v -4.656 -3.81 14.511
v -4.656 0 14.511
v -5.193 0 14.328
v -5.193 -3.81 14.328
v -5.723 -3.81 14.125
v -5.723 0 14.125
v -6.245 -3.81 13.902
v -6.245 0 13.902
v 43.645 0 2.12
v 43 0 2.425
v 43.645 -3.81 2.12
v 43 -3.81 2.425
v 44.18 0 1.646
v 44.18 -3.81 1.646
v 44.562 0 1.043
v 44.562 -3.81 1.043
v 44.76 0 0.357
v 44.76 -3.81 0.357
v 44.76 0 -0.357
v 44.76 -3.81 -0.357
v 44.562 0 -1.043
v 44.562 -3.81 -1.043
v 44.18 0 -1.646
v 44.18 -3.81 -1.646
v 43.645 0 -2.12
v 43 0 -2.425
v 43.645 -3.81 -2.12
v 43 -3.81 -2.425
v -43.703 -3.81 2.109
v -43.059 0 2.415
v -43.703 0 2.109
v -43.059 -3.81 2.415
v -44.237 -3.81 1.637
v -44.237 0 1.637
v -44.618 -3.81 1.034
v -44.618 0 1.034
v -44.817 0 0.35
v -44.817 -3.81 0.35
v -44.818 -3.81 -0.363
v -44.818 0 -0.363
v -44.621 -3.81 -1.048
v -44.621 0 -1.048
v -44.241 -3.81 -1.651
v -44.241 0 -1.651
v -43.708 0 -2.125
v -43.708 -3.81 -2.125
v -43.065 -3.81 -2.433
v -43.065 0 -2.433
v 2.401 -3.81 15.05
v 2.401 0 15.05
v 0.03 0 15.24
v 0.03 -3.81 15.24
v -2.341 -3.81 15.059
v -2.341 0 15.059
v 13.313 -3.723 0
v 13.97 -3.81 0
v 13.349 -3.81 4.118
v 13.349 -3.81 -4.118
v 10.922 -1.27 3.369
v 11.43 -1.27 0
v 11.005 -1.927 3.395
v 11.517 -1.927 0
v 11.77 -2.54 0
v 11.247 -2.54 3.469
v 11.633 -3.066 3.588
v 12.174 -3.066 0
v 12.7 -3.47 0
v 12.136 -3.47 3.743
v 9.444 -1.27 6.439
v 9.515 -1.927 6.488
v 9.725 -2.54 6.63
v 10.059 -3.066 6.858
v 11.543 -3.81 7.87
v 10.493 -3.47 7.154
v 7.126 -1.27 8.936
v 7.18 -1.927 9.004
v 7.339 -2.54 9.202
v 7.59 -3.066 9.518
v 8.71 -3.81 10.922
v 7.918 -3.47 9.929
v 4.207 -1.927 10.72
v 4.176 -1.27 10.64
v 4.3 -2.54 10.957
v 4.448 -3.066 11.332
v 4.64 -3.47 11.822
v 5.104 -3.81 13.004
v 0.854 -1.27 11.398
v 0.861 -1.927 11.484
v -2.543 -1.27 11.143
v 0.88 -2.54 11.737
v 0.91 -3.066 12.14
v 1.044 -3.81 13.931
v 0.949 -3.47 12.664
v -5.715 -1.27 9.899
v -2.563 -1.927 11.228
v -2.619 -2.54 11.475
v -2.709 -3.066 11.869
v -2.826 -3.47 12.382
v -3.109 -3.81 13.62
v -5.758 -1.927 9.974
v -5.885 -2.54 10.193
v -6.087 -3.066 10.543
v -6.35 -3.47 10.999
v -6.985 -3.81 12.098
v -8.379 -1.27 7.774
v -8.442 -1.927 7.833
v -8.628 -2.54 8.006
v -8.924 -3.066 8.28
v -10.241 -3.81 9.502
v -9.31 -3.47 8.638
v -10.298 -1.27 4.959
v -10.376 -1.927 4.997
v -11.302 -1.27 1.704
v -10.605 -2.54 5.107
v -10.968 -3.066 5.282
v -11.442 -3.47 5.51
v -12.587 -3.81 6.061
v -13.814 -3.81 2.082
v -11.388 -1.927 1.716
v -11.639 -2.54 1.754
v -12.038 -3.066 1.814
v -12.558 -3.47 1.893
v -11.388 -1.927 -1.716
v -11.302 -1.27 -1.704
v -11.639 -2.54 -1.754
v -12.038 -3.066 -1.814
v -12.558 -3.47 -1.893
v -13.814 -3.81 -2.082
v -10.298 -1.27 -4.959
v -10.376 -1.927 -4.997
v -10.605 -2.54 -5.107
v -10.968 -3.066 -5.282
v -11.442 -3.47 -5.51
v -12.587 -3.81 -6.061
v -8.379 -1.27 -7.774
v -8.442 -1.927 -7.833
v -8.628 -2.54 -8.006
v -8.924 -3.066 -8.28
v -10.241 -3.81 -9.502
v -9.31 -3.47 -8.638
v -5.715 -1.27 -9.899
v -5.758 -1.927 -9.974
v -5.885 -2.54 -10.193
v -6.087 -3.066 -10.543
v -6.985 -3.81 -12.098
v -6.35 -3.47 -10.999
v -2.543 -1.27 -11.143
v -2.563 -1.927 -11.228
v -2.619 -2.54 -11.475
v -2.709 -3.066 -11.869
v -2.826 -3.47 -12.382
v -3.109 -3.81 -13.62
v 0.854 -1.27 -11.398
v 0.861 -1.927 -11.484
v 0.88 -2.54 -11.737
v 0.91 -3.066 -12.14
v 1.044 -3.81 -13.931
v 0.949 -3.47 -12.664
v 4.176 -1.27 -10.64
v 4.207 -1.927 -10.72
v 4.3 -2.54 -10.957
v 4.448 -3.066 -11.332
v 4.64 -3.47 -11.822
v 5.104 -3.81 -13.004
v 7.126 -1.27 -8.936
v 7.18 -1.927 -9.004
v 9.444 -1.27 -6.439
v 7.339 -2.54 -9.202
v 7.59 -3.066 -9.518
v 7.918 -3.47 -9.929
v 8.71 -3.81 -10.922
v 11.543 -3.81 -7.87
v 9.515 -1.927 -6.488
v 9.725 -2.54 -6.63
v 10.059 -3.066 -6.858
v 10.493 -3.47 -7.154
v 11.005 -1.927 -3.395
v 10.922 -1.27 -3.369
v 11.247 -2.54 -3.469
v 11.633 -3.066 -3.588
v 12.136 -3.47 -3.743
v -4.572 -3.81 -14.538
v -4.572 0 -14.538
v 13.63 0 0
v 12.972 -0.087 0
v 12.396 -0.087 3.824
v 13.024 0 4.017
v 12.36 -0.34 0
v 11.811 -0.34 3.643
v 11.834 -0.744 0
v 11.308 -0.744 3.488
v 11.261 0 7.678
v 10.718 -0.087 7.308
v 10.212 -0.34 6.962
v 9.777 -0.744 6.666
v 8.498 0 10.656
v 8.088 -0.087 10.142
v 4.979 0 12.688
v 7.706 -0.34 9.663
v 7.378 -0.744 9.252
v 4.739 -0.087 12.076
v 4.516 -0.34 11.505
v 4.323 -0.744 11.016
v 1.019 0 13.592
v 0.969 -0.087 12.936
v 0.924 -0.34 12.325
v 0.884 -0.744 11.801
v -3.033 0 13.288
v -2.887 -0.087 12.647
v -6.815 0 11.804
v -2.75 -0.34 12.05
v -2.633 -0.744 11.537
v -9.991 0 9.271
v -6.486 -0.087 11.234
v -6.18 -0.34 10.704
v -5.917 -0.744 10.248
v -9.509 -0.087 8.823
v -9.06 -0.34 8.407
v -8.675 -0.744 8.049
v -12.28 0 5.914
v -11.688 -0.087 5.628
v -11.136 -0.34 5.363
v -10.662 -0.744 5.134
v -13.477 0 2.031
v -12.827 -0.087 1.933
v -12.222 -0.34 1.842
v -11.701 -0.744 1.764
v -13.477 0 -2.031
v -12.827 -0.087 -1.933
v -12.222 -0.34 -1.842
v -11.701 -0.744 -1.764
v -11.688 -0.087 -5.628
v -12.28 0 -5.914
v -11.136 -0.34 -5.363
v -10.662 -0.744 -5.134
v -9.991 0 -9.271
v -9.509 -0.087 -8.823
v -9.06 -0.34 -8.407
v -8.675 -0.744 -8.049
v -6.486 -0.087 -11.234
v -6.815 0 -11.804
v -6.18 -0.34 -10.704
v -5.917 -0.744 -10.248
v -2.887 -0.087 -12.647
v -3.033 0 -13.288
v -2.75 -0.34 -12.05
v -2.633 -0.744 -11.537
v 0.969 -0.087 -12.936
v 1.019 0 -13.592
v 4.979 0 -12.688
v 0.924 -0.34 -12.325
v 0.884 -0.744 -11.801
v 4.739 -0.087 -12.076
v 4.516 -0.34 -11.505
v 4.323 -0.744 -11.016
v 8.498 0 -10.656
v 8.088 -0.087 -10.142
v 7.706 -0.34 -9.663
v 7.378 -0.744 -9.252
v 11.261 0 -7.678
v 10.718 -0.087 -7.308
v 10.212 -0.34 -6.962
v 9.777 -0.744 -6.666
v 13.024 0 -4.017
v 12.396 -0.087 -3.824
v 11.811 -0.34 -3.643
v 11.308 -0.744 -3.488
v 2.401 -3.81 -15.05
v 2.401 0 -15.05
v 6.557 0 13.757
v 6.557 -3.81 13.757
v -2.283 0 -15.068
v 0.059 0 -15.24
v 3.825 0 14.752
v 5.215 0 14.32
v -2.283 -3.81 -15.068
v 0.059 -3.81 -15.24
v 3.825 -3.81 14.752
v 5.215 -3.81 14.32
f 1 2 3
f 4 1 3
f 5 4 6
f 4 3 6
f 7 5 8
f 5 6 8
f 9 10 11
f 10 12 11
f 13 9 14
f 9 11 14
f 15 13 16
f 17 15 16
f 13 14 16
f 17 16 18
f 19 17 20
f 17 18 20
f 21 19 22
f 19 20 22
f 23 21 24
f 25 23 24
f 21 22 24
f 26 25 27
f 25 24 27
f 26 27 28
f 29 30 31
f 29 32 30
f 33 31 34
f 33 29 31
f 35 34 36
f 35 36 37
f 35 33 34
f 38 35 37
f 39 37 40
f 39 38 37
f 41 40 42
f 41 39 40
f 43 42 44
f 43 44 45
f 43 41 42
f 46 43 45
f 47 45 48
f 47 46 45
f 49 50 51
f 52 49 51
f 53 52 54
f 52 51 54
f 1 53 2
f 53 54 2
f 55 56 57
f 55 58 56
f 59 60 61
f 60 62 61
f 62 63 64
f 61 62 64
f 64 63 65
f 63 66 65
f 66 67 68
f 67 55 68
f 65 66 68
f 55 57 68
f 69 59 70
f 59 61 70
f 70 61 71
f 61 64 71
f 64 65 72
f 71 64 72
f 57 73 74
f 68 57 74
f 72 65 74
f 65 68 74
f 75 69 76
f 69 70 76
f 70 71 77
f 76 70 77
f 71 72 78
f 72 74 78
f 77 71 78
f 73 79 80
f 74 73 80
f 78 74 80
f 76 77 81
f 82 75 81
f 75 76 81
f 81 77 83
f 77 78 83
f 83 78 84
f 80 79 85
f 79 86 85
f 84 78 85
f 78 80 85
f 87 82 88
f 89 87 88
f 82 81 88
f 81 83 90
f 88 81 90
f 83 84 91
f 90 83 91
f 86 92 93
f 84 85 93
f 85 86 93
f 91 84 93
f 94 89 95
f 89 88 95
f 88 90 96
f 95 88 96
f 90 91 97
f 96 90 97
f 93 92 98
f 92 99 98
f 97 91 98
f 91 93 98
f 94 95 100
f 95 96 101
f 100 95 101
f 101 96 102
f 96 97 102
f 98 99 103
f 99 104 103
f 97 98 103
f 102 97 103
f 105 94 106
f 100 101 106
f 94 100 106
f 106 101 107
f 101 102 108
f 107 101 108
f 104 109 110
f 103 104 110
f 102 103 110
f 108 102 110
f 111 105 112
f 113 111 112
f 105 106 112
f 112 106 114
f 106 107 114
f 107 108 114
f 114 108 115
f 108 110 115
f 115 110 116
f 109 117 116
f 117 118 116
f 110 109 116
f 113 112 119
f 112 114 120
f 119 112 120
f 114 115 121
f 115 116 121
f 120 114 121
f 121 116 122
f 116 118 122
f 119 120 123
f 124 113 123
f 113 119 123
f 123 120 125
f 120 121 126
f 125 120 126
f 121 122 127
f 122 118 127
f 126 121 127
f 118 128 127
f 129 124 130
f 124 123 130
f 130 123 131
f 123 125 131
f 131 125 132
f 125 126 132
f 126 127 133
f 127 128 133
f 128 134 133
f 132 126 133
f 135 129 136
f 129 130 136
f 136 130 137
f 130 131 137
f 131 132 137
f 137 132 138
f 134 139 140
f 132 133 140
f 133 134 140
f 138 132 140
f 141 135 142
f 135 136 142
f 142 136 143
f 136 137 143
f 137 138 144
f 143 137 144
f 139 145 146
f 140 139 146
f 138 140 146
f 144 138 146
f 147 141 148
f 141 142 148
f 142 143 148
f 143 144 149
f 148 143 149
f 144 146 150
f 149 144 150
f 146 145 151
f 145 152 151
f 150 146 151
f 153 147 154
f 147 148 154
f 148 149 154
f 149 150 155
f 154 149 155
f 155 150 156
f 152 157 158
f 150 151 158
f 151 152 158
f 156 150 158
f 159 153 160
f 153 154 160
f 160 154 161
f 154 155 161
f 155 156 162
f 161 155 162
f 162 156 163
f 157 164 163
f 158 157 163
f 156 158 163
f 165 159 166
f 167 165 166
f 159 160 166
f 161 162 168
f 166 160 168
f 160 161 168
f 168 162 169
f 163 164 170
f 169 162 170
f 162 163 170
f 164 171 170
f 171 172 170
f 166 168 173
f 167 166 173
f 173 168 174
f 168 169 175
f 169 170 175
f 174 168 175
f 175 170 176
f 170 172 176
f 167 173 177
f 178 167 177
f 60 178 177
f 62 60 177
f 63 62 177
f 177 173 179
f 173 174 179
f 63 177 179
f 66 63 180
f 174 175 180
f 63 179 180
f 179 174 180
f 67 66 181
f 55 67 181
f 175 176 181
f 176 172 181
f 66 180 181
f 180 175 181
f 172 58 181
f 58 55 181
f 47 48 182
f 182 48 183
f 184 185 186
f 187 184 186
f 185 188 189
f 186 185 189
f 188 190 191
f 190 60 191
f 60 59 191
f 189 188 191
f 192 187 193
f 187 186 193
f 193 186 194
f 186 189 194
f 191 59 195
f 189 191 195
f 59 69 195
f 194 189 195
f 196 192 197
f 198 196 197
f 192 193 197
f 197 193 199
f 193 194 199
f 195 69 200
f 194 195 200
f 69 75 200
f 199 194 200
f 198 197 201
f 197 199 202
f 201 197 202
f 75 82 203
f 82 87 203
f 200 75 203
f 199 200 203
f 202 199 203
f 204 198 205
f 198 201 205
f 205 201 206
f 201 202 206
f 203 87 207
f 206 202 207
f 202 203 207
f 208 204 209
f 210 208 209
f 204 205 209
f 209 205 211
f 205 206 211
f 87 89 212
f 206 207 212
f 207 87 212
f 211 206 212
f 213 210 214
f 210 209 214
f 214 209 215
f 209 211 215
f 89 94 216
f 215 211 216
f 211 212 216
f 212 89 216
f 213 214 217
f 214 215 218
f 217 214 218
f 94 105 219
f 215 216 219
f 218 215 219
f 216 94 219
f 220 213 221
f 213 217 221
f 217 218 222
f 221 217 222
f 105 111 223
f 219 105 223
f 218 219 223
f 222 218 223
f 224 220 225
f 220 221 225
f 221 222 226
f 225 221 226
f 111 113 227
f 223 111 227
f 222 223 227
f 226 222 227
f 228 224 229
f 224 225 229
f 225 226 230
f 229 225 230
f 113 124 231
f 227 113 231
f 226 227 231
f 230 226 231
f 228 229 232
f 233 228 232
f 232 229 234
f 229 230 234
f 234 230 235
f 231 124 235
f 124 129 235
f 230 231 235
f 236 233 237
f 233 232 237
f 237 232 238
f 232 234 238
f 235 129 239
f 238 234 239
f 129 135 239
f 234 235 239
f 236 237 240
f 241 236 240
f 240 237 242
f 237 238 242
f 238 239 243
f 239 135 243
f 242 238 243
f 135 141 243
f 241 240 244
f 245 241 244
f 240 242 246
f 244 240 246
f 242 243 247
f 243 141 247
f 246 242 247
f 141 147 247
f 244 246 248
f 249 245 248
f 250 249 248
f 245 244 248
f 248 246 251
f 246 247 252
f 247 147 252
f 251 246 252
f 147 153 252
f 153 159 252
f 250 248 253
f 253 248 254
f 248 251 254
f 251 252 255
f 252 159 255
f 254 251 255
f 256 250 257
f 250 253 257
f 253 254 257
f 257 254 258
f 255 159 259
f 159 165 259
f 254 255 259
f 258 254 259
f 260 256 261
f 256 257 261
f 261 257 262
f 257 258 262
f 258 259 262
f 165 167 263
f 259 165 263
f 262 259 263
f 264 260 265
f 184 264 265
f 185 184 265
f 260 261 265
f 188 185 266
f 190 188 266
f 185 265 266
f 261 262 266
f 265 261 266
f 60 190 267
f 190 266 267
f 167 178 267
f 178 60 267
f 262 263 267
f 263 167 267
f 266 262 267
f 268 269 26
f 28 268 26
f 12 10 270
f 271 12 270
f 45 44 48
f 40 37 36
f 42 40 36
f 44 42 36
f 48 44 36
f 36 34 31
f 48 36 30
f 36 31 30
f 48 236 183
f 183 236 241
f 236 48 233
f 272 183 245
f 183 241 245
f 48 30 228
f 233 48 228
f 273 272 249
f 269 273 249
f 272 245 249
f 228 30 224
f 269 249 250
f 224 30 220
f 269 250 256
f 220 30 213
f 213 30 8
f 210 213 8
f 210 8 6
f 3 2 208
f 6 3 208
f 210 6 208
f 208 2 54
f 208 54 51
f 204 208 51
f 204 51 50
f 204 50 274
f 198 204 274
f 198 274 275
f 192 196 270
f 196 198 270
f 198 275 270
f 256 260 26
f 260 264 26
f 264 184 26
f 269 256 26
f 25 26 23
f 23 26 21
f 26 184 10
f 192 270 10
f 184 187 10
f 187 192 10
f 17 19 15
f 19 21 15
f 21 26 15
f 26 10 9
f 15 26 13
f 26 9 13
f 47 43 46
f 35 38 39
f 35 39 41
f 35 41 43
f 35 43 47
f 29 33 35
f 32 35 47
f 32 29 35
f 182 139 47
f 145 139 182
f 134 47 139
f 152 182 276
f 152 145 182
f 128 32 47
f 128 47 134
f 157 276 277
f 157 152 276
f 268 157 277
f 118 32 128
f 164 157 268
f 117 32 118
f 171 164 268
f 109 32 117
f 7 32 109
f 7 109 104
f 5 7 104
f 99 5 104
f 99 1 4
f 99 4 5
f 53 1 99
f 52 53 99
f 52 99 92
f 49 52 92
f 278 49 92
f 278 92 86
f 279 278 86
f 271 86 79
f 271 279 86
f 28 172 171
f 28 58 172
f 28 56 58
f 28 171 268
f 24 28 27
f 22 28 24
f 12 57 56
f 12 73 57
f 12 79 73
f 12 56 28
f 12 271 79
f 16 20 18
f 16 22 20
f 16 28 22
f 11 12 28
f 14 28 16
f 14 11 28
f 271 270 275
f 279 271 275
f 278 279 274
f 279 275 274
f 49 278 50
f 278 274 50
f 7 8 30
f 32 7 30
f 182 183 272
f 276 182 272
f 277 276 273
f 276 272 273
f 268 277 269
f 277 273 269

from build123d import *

# Parameters (mm, degrees)
F0_R     = 11.43
F1_DEPTH = 3.81
F2_R     = 2.54


# Not quite as in the source:
# - a fillet or chamfer that OpenCascade refuses, or shapes differently, is made with other operations: its cross-section is extruded or revolved along the edge and cut away or added


with BuildPart() as f1:
    # F0 (on Front) → F1 (new body)
    with BuildSketch(Plane.XZ):
        with BuildLine():
            Line((6.5569237481, 13.7573380769), (2.4006070358, 15.0497403918))
            ThreePointArc((2.4006070358, 15.0497403918), (-1.1592691439, 15.195844664), (-4.6557853401, 14.5114183617))
            ThreePointArc((-4.6557853401, 14.5114183617), (-5.4590945375, 14.2286994076), (-6.2453574463, 13.9015506462))
            Line((-6.2453574463, 13.9015506462), (-50.8, 0))
            Line((-50.8, 0), (-4.5719998884, -14.5380334647))
            ThreePointArc((-4.5719998884, -14.5380334647), (-1.1154361142, -15.1991250497), (2.4006070358, -15.0497403918))
            Line((2.4006070358, -15.0497403918), (50.8, 0))
            Line((50.8, 0), (6.5569237481, 13.7573380769))
        make_face()
        Circle(F0_R, mode=Mode.SUBTRACT)
        with BuildLine():
            ThreePointArc((6.5569237481, 13.7573380769), (4.5251425803, 14.552686509), (2.4006070358, 15.0497403918))
            Line((2.4006070358, 15.0497403918), (6.5569237481, 13.7573380769))
        make_face()
    extrude(amount=F1_DEPTH)

    # F2
    f2_edges = [f1.edges().sort_by_distance(p)[0] for p in [
        (50.8, -1.905, 0),
        (-50.8, -1.905, 0),
        (-11.43, -3.81, 0),
    ]]
    fillet(f2_edges, radius=F2_R)

    # F3: fillet of radius 2.54 on 1 edges, made by hand

    # F3_s1 → F3_t2 (revolve, cut)
    with BuildSketch(Plane.XY):
        with BuildLine():
            ThreePointArc((13.6297045256, 0), (12.3597045256, -0.3402954744), (11.43, -1.27))
            Line((11.43, -1.27), (11.43, 0))
            Line((11.43, 0), (13.6297045256, 0))
        make_face()
    revolve(axis=Axis((0, 0, 0), (0, -1, 0)), mode=Mode.SUBTRACT)


solid = f1.part
